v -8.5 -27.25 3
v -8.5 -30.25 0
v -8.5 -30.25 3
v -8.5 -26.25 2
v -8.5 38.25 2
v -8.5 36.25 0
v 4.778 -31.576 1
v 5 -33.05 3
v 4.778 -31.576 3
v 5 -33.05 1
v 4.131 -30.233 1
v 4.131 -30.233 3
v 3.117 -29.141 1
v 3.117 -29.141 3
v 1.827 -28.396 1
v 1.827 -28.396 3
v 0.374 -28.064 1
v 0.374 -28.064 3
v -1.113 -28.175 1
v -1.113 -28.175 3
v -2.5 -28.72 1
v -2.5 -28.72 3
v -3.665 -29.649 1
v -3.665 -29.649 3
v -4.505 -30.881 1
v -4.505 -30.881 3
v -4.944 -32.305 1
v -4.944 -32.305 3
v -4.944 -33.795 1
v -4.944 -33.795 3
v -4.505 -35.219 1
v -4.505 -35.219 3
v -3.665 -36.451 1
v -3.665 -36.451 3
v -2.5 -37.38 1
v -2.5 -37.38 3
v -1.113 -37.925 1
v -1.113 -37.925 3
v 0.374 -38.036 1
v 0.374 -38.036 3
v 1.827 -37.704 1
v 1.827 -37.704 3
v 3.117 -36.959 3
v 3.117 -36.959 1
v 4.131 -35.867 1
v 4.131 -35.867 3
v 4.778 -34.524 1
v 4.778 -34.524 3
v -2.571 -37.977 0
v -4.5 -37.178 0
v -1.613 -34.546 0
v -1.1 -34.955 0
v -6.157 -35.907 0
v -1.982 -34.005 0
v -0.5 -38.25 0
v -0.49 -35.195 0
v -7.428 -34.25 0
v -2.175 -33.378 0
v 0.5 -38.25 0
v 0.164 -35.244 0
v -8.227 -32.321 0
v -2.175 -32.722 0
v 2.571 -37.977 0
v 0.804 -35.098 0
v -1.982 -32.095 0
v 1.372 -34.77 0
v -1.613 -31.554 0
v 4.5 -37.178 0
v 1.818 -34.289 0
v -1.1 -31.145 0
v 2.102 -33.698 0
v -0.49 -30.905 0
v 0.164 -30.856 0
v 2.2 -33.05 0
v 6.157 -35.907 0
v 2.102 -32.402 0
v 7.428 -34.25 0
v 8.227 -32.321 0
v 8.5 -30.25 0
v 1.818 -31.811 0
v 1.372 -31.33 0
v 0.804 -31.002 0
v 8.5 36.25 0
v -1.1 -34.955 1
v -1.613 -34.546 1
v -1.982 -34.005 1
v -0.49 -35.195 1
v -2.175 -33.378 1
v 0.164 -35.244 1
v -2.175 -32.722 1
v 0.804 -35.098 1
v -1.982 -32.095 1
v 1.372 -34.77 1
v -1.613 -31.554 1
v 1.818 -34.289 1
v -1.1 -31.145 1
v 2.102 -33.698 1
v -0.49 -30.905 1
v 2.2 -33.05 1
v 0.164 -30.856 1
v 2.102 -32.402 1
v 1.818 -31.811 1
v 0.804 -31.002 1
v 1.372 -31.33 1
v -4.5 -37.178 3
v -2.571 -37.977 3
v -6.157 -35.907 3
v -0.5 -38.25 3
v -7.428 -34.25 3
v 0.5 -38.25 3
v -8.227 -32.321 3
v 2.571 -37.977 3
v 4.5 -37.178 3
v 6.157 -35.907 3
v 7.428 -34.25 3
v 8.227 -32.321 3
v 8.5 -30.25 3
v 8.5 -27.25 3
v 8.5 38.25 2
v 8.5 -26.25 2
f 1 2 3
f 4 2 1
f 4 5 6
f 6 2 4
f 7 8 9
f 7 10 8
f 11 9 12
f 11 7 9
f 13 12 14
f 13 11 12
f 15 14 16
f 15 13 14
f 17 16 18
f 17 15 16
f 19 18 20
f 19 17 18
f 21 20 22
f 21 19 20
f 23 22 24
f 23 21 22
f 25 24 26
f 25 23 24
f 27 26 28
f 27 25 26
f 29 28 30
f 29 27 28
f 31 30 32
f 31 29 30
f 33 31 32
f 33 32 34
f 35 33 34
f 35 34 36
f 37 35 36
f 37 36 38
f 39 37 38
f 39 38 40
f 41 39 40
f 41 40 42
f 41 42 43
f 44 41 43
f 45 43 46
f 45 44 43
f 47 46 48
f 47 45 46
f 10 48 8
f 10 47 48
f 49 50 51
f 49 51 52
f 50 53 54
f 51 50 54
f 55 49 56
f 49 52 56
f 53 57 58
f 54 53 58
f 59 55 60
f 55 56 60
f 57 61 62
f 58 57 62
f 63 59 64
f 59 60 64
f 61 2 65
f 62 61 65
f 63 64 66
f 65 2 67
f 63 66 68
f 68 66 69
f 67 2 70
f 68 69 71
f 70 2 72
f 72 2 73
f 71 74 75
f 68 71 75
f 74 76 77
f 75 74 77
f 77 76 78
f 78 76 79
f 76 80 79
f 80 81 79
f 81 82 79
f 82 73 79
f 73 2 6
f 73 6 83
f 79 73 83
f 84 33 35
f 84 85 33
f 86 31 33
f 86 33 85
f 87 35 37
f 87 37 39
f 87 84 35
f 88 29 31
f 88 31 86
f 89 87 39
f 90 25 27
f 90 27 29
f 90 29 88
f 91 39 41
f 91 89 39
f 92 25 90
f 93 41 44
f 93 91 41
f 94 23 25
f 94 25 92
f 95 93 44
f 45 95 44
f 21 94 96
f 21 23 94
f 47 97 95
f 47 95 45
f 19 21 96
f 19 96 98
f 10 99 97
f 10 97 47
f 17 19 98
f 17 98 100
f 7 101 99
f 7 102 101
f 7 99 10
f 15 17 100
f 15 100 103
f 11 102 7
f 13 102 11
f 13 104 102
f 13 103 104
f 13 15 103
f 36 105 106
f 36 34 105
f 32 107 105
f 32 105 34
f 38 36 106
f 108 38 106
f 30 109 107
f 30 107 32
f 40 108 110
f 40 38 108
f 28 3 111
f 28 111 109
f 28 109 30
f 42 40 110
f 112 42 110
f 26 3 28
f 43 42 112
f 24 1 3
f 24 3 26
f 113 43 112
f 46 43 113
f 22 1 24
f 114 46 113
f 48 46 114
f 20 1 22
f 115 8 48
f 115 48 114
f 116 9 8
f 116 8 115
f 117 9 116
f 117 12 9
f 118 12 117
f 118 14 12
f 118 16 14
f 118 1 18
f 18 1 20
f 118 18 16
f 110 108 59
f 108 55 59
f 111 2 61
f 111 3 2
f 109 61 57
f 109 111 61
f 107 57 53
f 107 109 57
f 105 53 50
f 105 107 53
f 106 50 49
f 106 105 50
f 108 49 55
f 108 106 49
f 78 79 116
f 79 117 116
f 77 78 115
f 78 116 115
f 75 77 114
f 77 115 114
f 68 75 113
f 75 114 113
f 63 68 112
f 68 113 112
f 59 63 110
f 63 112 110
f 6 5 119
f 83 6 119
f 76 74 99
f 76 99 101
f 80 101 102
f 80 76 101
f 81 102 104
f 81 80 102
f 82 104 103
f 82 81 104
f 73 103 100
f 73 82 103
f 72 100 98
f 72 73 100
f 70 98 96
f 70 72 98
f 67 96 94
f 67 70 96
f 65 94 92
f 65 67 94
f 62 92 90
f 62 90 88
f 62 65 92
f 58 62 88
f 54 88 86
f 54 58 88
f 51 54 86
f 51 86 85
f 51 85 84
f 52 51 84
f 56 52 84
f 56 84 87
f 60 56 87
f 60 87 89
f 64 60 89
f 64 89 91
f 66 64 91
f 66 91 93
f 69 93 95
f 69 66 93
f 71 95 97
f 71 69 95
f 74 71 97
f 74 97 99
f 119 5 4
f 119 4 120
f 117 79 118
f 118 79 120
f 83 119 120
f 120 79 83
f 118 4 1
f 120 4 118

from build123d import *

# Parameters (mm, degrees)
F0_W     = 17
F0_H     = 64.5
F0_H_2   = 12
F0_R     = 5
F1_DEPTH = 2
F2_R     = 8
F3_SIZE  = 1.99999
F0_R_2   = 2.2
F4_DEPTH = 1
F5_DEPTH = 3
F6_R     = 8
F7_SIZE  = 0.99999


# Not quite as in the source:
# - a fillet or chamfer is up to 0.001 mm smaller than in the source, because OpenCascade refuses the exact size


with BuildPart() as f1:
    # F0 (on Top) → F1 (new body)
    with BuildSketch(Plane.XY):
        with Locations((0, 6)):
            Rectangle(F0_W, F0_H)
        with Locations((0, -32.25)):
            Rectangle(F0_W, F0_H_2)
        with Locations((0, -33.05)):
            Circle(F0_R, mode=Mode.SUBTRACT)
    extrude(amount=F1_DEPTH)

    # F2
    f2_edges = [f1.edges().sort_by_distance(p)[0] for p in [
        (8.5, -38.25, 1),
        (-8.5, -38.25, 1),
    ]]
    fillet(f2_edges, radius=F2_R)

    # F3 (size 2 in the source; OpenCascade refuses exactly that, so slightly less here)
    f3_edges = [f1.edges().sort_by_distance(p)[0] for p in [
        (0, 38.25, 0),
    ]]
    chamfer(f3_edges, length=F3_SIZE)

    # F0 (on Top) → F4 (join)
    with BuildSketch(Plane.XY):
        with Locations((0, -33.05)):
            Circle(F0_R)
        with Locations((0, -33.05)):
            Circle(F0_R_2, mode=Mode.SUBTRACT)
    extrude(amount=F4_DEPTH)

    # F0 (on Top) → F5 (join)
    with BuildSketch(Plane.XY):
        with Locations((0, -32.25)):
            Rectangle(F0_W, F0_H_2)
        with Locations((0, -33.05)):
            Circle(F0_R, mode=Mode.SUBTRACT)
    extrude(amount=F5_DEPTH)

    # F6
    f6_edges = [f1.edges().sort_by_distance(p)[0] for p in [
        (8.5, -38.25, 1.5),
        (-8.5, -38.25, 1.5),
    ]]
    fillet(f6_edges, radius=F6_R)

    # F7 (size 1 in the source; OpenCascade refuses exactly that, so slightly less here)
    f7_edges = [f1.edges().sort_by_distance(p)[0] for p in [
        (0, -26.25, 3),
    ]]
    chamfer(f7_edges, length=F7_SIZE)


solid = f1.part
